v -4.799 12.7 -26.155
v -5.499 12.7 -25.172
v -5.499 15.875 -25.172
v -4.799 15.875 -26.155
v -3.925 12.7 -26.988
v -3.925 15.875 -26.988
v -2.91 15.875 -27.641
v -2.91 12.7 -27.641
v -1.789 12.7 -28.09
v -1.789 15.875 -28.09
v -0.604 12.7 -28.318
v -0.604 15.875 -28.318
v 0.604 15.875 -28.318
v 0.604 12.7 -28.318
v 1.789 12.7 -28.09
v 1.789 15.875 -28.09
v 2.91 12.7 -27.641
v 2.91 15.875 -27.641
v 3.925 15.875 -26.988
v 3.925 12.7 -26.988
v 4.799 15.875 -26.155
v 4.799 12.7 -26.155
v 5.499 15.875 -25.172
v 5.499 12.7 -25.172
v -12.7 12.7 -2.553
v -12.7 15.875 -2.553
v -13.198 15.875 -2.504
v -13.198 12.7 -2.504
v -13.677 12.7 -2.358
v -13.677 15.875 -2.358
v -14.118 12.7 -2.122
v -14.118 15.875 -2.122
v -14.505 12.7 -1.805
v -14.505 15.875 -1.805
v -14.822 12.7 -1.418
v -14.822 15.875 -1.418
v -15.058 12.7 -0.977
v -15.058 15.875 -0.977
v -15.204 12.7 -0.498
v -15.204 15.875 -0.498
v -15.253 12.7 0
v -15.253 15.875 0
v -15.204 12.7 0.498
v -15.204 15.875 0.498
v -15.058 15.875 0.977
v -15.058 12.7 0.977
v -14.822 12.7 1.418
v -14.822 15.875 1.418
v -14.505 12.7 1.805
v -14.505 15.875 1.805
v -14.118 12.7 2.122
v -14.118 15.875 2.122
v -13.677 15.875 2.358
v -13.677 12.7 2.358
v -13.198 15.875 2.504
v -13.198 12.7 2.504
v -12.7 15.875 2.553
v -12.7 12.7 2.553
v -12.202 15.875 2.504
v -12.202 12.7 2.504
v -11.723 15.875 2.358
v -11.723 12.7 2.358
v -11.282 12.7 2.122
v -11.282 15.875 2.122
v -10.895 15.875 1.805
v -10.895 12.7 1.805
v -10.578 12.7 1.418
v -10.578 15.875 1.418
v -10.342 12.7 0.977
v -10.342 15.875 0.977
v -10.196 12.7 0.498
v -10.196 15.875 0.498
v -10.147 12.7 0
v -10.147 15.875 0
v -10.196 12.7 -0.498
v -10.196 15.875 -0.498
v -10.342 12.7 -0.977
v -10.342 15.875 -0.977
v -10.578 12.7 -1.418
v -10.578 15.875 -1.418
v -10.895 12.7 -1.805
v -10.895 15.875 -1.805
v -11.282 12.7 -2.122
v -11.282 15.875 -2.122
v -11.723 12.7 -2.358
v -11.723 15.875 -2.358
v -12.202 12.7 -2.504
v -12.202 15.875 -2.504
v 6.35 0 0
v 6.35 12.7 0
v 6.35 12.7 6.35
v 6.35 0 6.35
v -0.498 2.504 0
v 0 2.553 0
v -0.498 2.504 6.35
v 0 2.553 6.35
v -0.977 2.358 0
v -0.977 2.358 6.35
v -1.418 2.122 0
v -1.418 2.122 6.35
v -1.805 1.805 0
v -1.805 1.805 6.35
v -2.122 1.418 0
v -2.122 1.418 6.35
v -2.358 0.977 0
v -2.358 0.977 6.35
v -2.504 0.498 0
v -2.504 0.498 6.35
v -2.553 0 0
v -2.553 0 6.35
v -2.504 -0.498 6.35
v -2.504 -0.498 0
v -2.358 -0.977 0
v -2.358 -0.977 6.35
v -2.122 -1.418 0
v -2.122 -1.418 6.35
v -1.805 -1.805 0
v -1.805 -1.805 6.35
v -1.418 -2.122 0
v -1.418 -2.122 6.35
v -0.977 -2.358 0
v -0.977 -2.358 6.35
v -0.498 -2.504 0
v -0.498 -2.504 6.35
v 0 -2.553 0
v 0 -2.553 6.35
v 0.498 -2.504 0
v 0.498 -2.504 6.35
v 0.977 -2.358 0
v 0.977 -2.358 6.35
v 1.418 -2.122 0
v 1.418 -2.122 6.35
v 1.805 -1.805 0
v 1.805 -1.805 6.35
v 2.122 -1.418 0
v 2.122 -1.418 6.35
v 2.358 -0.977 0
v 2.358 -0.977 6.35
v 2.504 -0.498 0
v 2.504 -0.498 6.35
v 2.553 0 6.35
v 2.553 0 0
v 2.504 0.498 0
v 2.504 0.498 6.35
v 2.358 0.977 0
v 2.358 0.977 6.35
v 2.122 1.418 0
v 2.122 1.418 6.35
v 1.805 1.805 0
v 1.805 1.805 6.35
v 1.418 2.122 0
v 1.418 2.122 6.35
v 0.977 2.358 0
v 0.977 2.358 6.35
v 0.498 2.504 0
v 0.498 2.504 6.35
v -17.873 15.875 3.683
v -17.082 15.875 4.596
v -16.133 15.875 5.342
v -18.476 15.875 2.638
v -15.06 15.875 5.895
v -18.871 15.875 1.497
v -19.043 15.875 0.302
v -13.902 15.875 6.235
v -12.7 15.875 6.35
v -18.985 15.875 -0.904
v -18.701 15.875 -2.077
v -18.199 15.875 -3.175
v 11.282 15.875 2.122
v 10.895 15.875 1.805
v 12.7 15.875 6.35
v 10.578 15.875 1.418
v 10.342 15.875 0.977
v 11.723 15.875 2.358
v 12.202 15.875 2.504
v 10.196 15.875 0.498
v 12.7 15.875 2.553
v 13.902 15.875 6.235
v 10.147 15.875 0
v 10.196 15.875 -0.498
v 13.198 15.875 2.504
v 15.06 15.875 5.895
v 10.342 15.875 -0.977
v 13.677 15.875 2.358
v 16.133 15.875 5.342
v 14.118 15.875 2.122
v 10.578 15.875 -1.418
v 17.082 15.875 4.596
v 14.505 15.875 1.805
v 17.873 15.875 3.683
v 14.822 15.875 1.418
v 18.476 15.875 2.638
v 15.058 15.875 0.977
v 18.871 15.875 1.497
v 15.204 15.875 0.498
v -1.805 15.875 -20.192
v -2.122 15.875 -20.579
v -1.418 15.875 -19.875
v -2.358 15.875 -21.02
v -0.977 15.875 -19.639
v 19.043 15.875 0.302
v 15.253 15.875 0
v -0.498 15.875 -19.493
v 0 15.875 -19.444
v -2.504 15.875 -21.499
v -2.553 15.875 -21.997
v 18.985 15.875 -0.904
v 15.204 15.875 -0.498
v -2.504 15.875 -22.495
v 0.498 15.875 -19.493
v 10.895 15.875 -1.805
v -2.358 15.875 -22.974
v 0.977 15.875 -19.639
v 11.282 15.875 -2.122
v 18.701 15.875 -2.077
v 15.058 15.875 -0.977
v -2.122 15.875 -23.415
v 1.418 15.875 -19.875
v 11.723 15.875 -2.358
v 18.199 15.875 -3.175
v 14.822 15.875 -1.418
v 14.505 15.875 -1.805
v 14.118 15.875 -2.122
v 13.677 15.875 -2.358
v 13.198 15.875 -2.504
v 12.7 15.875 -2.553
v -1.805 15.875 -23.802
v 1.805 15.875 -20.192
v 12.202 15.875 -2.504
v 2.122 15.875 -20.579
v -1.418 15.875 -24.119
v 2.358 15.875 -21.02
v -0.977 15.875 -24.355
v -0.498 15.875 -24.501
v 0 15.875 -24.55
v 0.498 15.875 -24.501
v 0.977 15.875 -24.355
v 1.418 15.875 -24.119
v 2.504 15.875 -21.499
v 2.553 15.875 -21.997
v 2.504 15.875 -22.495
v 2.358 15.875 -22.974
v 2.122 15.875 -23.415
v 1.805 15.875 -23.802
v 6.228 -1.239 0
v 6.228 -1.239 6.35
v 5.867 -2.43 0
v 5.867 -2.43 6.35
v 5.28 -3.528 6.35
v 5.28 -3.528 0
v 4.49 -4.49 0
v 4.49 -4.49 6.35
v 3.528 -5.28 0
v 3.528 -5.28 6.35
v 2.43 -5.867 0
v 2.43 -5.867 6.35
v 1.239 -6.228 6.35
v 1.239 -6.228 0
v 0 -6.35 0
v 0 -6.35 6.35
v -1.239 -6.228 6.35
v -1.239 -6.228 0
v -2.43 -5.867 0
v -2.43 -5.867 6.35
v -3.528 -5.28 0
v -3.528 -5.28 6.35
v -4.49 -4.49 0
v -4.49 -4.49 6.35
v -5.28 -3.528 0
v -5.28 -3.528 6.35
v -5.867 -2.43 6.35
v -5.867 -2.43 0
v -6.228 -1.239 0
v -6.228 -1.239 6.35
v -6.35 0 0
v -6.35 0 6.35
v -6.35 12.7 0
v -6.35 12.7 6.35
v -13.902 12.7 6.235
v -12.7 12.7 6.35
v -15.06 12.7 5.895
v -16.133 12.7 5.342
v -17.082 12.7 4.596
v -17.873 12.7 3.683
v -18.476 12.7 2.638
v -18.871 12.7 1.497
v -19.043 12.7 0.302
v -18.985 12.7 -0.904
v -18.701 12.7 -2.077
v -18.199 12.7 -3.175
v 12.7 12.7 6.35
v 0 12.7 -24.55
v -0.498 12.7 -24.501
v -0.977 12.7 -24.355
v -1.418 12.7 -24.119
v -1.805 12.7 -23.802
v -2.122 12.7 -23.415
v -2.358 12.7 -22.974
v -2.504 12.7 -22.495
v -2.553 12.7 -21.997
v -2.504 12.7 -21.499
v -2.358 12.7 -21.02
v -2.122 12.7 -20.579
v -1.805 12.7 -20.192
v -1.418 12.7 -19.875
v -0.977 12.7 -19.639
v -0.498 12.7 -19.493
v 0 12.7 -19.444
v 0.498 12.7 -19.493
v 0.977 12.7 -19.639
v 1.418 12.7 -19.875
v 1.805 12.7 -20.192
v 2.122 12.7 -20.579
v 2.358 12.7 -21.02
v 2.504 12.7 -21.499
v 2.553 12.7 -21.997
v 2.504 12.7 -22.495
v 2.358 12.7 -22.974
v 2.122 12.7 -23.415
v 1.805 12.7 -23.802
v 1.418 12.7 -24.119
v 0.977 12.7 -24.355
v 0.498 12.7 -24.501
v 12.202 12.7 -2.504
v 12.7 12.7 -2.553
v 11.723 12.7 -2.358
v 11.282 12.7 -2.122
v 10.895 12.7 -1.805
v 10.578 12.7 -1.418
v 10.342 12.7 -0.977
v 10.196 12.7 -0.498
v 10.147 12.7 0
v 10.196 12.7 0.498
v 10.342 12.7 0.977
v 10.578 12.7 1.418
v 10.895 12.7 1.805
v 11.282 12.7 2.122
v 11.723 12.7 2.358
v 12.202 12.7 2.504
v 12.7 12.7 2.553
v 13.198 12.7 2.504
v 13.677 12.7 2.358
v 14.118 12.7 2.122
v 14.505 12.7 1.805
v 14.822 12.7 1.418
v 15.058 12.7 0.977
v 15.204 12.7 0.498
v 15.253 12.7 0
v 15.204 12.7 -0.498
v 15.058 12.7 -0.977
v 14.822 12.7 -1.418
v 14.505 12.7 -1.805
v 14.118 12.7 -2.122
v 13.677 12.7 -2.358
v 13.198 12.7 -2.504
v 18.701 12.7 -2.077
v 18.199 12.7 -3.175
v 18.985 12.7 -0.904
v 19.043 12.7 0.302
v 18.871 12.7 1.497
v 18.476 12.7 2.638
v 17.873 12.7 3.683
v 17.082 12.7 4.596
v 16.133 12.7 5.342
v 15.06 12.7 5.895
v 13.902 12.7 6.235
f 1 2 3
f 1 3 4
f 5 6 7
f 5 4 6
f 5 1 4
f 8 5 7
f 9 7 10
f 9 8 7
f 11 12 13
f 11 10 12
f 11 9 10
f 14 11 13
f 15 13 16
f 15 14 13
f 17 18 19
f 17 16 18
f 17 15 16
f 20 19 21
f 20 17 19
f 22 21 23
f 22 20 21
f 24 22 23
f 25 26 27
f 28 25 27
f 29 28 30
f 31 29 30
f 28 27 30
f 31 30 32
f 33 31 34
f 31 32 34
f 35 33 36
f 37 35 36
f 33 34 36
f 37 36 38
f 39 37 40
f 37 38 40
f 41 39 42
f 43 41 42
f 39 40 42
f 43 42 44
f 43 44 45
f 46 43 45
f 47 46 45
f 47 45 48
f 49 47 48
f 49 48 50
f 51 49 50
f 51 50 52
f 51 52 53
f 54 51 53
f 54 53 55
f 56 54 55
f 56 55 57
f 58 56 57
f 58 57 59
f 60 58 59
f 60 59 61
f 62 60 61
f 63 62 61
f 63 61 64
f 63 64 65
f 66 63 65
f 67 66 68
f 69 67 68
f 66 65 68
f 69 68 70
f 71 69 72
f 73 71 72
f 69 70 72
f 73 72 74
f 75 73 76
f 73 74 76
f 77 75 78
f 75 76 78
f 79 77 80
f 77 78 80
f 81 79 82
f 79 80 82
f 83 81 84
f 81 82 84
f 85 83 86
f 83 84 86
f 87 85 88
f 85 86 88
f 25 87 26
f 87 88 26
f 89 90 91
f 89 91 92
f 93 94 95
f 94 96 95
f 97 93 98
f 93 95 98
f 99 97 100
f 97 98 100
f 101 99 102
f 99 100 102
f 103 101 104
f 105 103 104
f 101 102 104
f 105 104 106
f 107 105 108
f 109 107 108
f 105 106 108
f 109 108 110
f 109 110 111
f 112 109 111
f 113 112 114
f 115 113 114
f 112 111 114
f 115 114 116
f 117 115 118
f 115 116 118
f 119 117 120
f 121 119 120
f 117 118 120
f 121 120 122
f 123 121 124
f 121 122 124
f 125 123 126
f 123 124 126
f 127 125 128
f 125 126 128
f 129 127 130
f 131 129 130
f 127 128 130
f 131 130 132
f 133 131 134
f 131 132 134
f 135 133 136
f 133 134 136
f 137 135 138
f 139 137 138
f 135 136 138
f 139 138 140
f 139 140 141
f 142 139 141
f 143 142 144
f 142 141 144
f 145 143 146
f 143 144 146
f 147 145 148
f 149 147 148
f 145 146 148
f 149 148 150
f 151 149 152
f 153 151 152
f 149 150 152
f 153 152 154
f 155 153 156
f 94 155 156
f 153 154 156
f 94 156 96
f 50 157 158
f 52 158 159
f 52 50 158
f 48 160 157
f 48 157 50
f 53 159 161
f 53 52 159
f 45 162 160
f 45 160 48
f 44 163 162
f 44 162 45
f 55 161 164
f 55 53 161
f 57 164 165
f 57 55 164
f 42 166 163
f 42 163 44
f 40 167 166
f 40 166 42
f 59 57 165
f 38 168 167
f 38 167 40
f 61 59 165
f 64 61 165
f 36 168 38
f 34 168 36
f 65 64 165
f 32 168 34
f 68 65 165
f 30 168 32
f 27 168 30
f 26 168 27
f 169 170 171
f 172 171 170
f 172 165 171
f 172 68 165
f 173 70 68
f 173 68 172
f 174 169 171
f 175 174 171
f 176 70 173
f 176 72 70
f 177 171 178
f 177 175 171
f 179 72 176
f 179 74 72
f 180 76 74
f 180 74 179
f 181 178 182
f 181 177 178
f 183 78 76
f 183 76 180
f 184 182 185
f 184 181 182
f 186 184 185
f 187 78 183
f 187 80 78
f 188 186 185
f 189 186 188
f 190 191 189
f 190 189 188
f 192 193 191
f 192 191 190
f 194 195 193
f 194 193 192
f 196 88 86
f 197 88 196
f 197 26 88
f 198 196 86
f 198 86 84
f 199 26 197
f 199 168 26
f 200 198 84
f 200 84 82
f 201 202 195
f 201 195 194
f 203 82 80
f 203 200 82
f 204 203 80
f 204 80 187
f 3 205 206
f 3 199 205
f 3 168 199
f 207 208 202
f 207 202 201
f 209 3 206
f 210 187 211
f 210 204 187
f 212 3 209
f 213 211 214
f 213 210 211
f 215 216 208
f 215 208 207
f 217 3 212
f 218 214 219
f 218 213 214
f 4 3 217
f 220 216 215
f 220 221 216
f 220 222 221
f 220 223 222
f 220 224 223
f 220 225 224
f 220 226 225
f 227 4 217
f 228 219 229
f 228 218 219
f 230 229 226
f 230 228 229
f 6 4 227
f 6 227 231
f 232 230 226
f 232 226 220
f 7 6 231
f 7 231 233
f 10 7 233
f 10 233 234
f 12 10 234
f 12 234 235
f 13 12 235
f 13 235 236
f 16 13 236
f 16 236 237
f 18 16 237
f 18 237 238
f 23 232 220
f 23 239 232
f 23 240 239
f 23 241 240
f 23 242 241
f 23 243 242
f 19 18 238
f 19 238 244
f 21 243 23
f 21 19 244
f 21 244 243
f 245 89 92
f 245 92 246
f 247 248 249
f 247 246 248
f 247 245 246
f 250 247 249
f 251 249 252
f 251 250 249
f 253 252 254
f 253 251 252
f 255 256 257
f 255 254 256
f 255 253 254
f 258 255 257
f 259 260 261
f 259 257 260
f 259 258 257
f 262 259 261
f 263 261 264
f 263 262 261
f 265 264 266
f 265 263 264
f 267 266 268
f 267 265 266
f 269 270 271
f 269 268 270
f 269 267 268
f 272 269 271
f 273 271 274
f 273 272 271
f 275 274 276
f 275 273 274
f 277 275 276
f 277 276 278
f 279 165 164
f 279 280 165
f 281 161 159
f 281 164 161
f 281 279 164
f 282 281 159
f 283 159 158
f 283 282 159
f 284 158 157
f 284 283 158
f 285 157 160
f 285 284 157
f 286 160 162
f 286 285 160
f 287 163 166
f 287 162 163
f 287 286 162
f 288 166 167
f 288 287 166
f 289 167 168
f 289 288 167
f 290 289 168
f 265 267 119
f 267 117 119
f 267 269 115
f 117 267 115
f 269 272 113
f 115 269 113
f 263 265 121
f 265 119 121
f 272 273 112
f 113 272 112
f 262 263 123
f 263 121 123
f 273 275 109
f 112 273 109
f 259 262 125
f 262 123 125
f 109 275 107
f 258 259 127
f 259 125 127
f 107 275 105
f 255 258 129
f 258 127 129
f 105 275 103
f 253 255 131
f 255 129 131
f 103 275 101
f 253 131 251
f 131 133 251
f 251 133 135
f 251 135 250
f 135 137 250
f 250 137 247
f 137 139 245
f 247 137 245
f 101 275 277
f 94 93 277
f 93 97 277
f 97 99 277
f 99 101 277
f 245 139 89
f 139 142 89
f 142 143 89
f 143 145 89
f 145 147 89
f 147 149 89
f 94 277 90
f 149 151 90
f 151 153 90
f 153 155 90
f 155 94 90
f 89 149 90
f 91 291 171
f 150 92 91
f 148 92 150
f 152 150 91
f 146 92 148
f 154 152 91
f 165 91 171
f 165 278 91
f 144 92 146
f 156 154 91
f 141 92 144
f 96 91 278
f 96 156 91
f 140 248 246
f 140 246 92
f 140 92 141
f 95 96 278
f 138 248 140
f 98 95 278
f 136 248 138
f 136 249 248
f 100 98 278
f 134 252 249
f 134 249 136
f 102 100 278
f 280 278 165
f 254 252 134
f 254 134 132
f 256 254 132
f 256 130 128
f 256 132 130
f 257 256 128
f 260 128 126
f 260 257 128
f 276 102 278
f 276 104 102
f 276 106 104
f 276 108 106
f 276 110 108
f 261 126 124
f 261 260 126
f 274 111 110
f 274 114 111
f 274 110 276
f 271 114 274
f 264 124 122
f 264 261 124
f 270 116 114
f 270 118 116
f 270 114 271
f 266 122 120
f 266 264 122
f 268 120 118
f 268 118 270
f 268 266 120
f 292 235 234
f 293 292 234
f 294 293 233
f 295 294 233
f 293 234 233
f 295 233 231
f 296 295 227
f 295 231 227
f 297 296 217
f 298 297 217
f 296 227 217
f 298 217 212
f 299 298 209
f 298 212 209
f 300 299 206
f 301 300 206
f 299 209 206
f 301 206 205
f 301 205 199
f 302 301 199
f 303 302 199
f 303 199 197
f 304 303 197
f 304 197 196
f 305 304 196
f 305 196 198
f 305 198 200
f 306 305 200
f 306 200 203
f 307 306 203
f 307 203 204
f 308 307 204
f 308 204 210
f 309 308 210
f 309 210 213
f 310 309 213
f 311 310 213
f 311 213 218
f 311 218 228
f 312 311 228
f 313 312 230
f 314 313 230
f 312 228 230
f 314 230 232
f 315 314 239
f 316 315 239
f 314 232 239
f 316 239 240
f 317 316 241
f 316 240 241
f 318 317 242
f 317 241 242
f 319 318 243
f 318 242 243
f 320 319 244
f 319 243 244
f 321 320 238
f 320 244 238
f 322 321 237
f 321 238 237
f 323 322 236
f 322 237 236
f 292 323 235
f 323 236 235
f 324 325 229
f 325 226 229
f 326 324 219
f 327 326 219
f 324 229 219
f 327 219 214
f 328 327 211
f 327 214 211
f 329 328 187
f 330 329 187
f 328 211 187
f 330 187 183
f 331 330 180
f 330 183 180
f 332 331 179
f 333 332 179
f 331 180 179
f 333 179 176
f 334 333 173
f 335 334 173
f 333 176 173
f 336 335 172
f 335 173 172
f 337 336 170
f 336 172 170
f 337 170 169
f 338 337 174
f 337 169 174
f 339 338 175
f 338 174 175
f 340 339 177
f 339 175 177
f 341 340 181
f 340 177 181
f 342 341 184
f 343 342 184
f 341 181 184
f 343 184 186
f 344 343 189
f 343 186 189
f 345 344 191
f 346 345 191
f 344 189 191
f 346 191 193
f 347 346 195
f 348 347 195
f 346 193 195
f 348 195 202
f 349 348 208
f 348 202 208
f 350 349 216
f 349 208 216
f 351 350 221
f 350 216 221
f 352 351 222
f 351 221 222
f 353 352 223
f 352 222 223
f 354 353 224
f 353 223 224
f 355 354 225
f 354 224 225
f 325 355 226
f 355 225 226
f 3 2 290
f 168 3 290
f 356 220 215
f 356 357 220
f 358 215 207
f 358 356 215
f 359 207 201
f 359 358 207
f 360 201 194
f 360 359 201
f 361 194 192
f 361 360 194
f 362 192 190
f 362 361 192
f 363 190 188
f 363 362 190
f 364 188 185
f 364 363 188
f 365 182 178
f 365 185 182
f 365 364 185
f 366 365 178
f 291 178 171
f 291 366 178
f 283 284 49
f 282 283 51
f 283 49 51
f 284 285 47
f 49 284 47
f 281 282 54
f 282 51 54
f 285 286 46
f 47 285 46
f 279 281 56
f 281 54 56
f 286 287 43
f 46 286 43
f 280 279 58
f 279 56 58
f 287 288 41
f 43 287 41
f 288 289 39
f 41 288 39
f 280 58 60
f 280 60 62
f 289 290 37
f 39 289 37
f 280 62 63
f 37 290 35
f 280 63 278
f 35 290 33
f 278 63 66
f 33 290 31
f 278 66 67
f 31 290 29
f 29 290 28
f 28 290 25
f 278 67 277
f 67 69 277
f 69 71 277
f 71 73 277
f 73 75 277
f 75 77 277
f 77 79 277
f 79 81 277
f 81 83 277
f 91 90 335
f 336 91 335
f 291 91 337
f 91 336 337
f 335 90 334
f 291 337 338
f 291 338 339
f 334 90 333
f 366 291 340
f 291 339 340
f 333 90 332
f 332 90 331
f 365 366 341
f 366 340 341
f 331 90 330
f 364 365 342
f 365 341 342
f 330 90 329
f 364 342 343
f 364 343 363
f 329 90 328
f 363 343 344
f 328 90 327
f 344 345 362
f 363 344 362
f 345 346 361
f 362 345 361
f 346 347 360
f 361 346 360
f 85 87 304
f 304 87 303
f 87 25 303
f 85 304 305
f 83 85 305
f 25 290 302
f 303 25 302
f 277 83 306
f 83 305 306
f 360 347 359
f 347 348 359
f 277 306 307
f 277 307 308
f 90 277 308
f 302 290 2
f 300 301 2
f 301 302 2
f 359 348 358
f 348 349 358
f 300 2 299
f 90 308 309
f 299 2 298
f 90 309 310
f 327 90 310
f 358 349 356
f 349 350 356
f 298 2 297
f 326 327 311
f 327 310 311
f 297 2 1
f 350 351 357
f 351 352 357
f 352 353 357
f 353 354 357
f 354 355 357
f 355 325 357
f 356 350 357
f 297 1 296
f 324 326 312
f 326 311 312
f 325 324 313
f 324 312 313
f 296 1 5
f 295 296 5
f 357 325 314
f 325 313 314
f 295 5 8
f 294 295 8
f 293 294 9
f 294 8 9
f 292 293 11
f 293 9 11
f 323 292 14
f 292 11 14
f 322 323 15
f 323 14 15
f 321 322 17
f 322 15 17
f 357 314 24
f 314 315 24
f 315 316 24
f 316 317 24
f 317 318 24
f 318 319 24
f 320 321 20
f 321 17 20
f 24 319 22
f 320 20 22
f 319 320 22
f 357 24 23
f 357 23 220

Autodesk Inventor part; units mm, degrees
ref_plane "YZ Plane" through (0, 0, 0) normal (1, 0, 0) x (0, 1, 0)
ref_plane "XZ Plane" through (0, 0, 0) normal (0, 1, 0) x (-1, 0, 0)
ref_plane "XY Plane" through (0, 0, 0) normal (0, 0, 1) x (1, 0, 0)
sketch "Sketch1" plane through (0, 0, 0) normal (0, 0, 1) x (1, 0, 0)
  circle A0 centre (0, 0) radius 6.35
  line L0 (-6.35, 0) -> (-6.35, 12.7)
  line L1 (-6.35, 12.7) -> (6.35, 12.7)
  line L2 (6.35, 12.7) -> (6.35, 0)
  dimension "d0" = 12.7
  dimension "d1" = 12.7
extrude "Extrusion1" add sketch "Sketch1" along normal blind 6.35
hole "Hole1" at (0, 0, 0) direction (0, 0, 1) diameter 5.1054 end through all clearance for "Flat Head Machine Screw (82)" size "#10" standard "Ansi Unified Screw Threads"
sketch "Sketch2" plane through (-6.35, 12.7, 0) normal (0, 1, 0) x (1, 0, 0)
  line L0 (6.35, 0) -> (19.05, 0) construction
  line L1 (6.35, 0) -> (-6.35, 0) construction
  line L2 (-6.35, 0) -> (6.35, 21.997) construction
  line L3 (6.35, 21.997) -> (19.05, 0) construction
  circle A0 centre (19.05, 0) radius 6.35 construction
  circle A1 centre (-6.35, 0) radius 6.35 construction
  circle A2 centre (6.35, 21.997) radius 6.35 construction
  line L4 (0.8507, 25.172) -> (-11.8493, 3.175)
  line L5 (11.8493, 25.172) -> (24.5493, 3.175)
  line L6 (19.05, -6.35) -> (12.7, -6.35)
  line L7 (0, -6.35) -> (12.7, -6.35) projected
  line L8 (12.7, -6.35) -> (0, -6.35)
  line L9 (0, -6.35) -> (-6.35, -6.35)
  arc A3 (-11.8493, 3.175) -> (-6.35, -6.35) centre (-6.35, 0) ccw
  arc A4 (11.8493, 25.172) -> (0.8507, 25.172) centre (6.35, 21.997) ccw
  arc A5 (19.05, -6.35) -> (24.5493, 3.175) centre (19.05, 0) ccw
  dimension "d11" = 12.7
  dimension "d12" = 12.7
  dimension "d13" = 25.4
  dimension "d14" = 25.4
  dimension "d15" = 12.7
  dimension "d16" = 12.7
  dimension "d17" = 12.7
extrude "Extrusion2" add sketch "Sketch2" along normal blind 3.175
hole "Hole2" at (12.7, 12.7, 0) at (0, 12.7, -21.997) at (-12.7, 12.7, 0) direction (0, 1, 0) diameter 5.1054 end through all clearance for "Flat Head Machine Screw (82)" size "#10" standard "Ansi Unified Screw Threads"
properties part number "Table Holder"
